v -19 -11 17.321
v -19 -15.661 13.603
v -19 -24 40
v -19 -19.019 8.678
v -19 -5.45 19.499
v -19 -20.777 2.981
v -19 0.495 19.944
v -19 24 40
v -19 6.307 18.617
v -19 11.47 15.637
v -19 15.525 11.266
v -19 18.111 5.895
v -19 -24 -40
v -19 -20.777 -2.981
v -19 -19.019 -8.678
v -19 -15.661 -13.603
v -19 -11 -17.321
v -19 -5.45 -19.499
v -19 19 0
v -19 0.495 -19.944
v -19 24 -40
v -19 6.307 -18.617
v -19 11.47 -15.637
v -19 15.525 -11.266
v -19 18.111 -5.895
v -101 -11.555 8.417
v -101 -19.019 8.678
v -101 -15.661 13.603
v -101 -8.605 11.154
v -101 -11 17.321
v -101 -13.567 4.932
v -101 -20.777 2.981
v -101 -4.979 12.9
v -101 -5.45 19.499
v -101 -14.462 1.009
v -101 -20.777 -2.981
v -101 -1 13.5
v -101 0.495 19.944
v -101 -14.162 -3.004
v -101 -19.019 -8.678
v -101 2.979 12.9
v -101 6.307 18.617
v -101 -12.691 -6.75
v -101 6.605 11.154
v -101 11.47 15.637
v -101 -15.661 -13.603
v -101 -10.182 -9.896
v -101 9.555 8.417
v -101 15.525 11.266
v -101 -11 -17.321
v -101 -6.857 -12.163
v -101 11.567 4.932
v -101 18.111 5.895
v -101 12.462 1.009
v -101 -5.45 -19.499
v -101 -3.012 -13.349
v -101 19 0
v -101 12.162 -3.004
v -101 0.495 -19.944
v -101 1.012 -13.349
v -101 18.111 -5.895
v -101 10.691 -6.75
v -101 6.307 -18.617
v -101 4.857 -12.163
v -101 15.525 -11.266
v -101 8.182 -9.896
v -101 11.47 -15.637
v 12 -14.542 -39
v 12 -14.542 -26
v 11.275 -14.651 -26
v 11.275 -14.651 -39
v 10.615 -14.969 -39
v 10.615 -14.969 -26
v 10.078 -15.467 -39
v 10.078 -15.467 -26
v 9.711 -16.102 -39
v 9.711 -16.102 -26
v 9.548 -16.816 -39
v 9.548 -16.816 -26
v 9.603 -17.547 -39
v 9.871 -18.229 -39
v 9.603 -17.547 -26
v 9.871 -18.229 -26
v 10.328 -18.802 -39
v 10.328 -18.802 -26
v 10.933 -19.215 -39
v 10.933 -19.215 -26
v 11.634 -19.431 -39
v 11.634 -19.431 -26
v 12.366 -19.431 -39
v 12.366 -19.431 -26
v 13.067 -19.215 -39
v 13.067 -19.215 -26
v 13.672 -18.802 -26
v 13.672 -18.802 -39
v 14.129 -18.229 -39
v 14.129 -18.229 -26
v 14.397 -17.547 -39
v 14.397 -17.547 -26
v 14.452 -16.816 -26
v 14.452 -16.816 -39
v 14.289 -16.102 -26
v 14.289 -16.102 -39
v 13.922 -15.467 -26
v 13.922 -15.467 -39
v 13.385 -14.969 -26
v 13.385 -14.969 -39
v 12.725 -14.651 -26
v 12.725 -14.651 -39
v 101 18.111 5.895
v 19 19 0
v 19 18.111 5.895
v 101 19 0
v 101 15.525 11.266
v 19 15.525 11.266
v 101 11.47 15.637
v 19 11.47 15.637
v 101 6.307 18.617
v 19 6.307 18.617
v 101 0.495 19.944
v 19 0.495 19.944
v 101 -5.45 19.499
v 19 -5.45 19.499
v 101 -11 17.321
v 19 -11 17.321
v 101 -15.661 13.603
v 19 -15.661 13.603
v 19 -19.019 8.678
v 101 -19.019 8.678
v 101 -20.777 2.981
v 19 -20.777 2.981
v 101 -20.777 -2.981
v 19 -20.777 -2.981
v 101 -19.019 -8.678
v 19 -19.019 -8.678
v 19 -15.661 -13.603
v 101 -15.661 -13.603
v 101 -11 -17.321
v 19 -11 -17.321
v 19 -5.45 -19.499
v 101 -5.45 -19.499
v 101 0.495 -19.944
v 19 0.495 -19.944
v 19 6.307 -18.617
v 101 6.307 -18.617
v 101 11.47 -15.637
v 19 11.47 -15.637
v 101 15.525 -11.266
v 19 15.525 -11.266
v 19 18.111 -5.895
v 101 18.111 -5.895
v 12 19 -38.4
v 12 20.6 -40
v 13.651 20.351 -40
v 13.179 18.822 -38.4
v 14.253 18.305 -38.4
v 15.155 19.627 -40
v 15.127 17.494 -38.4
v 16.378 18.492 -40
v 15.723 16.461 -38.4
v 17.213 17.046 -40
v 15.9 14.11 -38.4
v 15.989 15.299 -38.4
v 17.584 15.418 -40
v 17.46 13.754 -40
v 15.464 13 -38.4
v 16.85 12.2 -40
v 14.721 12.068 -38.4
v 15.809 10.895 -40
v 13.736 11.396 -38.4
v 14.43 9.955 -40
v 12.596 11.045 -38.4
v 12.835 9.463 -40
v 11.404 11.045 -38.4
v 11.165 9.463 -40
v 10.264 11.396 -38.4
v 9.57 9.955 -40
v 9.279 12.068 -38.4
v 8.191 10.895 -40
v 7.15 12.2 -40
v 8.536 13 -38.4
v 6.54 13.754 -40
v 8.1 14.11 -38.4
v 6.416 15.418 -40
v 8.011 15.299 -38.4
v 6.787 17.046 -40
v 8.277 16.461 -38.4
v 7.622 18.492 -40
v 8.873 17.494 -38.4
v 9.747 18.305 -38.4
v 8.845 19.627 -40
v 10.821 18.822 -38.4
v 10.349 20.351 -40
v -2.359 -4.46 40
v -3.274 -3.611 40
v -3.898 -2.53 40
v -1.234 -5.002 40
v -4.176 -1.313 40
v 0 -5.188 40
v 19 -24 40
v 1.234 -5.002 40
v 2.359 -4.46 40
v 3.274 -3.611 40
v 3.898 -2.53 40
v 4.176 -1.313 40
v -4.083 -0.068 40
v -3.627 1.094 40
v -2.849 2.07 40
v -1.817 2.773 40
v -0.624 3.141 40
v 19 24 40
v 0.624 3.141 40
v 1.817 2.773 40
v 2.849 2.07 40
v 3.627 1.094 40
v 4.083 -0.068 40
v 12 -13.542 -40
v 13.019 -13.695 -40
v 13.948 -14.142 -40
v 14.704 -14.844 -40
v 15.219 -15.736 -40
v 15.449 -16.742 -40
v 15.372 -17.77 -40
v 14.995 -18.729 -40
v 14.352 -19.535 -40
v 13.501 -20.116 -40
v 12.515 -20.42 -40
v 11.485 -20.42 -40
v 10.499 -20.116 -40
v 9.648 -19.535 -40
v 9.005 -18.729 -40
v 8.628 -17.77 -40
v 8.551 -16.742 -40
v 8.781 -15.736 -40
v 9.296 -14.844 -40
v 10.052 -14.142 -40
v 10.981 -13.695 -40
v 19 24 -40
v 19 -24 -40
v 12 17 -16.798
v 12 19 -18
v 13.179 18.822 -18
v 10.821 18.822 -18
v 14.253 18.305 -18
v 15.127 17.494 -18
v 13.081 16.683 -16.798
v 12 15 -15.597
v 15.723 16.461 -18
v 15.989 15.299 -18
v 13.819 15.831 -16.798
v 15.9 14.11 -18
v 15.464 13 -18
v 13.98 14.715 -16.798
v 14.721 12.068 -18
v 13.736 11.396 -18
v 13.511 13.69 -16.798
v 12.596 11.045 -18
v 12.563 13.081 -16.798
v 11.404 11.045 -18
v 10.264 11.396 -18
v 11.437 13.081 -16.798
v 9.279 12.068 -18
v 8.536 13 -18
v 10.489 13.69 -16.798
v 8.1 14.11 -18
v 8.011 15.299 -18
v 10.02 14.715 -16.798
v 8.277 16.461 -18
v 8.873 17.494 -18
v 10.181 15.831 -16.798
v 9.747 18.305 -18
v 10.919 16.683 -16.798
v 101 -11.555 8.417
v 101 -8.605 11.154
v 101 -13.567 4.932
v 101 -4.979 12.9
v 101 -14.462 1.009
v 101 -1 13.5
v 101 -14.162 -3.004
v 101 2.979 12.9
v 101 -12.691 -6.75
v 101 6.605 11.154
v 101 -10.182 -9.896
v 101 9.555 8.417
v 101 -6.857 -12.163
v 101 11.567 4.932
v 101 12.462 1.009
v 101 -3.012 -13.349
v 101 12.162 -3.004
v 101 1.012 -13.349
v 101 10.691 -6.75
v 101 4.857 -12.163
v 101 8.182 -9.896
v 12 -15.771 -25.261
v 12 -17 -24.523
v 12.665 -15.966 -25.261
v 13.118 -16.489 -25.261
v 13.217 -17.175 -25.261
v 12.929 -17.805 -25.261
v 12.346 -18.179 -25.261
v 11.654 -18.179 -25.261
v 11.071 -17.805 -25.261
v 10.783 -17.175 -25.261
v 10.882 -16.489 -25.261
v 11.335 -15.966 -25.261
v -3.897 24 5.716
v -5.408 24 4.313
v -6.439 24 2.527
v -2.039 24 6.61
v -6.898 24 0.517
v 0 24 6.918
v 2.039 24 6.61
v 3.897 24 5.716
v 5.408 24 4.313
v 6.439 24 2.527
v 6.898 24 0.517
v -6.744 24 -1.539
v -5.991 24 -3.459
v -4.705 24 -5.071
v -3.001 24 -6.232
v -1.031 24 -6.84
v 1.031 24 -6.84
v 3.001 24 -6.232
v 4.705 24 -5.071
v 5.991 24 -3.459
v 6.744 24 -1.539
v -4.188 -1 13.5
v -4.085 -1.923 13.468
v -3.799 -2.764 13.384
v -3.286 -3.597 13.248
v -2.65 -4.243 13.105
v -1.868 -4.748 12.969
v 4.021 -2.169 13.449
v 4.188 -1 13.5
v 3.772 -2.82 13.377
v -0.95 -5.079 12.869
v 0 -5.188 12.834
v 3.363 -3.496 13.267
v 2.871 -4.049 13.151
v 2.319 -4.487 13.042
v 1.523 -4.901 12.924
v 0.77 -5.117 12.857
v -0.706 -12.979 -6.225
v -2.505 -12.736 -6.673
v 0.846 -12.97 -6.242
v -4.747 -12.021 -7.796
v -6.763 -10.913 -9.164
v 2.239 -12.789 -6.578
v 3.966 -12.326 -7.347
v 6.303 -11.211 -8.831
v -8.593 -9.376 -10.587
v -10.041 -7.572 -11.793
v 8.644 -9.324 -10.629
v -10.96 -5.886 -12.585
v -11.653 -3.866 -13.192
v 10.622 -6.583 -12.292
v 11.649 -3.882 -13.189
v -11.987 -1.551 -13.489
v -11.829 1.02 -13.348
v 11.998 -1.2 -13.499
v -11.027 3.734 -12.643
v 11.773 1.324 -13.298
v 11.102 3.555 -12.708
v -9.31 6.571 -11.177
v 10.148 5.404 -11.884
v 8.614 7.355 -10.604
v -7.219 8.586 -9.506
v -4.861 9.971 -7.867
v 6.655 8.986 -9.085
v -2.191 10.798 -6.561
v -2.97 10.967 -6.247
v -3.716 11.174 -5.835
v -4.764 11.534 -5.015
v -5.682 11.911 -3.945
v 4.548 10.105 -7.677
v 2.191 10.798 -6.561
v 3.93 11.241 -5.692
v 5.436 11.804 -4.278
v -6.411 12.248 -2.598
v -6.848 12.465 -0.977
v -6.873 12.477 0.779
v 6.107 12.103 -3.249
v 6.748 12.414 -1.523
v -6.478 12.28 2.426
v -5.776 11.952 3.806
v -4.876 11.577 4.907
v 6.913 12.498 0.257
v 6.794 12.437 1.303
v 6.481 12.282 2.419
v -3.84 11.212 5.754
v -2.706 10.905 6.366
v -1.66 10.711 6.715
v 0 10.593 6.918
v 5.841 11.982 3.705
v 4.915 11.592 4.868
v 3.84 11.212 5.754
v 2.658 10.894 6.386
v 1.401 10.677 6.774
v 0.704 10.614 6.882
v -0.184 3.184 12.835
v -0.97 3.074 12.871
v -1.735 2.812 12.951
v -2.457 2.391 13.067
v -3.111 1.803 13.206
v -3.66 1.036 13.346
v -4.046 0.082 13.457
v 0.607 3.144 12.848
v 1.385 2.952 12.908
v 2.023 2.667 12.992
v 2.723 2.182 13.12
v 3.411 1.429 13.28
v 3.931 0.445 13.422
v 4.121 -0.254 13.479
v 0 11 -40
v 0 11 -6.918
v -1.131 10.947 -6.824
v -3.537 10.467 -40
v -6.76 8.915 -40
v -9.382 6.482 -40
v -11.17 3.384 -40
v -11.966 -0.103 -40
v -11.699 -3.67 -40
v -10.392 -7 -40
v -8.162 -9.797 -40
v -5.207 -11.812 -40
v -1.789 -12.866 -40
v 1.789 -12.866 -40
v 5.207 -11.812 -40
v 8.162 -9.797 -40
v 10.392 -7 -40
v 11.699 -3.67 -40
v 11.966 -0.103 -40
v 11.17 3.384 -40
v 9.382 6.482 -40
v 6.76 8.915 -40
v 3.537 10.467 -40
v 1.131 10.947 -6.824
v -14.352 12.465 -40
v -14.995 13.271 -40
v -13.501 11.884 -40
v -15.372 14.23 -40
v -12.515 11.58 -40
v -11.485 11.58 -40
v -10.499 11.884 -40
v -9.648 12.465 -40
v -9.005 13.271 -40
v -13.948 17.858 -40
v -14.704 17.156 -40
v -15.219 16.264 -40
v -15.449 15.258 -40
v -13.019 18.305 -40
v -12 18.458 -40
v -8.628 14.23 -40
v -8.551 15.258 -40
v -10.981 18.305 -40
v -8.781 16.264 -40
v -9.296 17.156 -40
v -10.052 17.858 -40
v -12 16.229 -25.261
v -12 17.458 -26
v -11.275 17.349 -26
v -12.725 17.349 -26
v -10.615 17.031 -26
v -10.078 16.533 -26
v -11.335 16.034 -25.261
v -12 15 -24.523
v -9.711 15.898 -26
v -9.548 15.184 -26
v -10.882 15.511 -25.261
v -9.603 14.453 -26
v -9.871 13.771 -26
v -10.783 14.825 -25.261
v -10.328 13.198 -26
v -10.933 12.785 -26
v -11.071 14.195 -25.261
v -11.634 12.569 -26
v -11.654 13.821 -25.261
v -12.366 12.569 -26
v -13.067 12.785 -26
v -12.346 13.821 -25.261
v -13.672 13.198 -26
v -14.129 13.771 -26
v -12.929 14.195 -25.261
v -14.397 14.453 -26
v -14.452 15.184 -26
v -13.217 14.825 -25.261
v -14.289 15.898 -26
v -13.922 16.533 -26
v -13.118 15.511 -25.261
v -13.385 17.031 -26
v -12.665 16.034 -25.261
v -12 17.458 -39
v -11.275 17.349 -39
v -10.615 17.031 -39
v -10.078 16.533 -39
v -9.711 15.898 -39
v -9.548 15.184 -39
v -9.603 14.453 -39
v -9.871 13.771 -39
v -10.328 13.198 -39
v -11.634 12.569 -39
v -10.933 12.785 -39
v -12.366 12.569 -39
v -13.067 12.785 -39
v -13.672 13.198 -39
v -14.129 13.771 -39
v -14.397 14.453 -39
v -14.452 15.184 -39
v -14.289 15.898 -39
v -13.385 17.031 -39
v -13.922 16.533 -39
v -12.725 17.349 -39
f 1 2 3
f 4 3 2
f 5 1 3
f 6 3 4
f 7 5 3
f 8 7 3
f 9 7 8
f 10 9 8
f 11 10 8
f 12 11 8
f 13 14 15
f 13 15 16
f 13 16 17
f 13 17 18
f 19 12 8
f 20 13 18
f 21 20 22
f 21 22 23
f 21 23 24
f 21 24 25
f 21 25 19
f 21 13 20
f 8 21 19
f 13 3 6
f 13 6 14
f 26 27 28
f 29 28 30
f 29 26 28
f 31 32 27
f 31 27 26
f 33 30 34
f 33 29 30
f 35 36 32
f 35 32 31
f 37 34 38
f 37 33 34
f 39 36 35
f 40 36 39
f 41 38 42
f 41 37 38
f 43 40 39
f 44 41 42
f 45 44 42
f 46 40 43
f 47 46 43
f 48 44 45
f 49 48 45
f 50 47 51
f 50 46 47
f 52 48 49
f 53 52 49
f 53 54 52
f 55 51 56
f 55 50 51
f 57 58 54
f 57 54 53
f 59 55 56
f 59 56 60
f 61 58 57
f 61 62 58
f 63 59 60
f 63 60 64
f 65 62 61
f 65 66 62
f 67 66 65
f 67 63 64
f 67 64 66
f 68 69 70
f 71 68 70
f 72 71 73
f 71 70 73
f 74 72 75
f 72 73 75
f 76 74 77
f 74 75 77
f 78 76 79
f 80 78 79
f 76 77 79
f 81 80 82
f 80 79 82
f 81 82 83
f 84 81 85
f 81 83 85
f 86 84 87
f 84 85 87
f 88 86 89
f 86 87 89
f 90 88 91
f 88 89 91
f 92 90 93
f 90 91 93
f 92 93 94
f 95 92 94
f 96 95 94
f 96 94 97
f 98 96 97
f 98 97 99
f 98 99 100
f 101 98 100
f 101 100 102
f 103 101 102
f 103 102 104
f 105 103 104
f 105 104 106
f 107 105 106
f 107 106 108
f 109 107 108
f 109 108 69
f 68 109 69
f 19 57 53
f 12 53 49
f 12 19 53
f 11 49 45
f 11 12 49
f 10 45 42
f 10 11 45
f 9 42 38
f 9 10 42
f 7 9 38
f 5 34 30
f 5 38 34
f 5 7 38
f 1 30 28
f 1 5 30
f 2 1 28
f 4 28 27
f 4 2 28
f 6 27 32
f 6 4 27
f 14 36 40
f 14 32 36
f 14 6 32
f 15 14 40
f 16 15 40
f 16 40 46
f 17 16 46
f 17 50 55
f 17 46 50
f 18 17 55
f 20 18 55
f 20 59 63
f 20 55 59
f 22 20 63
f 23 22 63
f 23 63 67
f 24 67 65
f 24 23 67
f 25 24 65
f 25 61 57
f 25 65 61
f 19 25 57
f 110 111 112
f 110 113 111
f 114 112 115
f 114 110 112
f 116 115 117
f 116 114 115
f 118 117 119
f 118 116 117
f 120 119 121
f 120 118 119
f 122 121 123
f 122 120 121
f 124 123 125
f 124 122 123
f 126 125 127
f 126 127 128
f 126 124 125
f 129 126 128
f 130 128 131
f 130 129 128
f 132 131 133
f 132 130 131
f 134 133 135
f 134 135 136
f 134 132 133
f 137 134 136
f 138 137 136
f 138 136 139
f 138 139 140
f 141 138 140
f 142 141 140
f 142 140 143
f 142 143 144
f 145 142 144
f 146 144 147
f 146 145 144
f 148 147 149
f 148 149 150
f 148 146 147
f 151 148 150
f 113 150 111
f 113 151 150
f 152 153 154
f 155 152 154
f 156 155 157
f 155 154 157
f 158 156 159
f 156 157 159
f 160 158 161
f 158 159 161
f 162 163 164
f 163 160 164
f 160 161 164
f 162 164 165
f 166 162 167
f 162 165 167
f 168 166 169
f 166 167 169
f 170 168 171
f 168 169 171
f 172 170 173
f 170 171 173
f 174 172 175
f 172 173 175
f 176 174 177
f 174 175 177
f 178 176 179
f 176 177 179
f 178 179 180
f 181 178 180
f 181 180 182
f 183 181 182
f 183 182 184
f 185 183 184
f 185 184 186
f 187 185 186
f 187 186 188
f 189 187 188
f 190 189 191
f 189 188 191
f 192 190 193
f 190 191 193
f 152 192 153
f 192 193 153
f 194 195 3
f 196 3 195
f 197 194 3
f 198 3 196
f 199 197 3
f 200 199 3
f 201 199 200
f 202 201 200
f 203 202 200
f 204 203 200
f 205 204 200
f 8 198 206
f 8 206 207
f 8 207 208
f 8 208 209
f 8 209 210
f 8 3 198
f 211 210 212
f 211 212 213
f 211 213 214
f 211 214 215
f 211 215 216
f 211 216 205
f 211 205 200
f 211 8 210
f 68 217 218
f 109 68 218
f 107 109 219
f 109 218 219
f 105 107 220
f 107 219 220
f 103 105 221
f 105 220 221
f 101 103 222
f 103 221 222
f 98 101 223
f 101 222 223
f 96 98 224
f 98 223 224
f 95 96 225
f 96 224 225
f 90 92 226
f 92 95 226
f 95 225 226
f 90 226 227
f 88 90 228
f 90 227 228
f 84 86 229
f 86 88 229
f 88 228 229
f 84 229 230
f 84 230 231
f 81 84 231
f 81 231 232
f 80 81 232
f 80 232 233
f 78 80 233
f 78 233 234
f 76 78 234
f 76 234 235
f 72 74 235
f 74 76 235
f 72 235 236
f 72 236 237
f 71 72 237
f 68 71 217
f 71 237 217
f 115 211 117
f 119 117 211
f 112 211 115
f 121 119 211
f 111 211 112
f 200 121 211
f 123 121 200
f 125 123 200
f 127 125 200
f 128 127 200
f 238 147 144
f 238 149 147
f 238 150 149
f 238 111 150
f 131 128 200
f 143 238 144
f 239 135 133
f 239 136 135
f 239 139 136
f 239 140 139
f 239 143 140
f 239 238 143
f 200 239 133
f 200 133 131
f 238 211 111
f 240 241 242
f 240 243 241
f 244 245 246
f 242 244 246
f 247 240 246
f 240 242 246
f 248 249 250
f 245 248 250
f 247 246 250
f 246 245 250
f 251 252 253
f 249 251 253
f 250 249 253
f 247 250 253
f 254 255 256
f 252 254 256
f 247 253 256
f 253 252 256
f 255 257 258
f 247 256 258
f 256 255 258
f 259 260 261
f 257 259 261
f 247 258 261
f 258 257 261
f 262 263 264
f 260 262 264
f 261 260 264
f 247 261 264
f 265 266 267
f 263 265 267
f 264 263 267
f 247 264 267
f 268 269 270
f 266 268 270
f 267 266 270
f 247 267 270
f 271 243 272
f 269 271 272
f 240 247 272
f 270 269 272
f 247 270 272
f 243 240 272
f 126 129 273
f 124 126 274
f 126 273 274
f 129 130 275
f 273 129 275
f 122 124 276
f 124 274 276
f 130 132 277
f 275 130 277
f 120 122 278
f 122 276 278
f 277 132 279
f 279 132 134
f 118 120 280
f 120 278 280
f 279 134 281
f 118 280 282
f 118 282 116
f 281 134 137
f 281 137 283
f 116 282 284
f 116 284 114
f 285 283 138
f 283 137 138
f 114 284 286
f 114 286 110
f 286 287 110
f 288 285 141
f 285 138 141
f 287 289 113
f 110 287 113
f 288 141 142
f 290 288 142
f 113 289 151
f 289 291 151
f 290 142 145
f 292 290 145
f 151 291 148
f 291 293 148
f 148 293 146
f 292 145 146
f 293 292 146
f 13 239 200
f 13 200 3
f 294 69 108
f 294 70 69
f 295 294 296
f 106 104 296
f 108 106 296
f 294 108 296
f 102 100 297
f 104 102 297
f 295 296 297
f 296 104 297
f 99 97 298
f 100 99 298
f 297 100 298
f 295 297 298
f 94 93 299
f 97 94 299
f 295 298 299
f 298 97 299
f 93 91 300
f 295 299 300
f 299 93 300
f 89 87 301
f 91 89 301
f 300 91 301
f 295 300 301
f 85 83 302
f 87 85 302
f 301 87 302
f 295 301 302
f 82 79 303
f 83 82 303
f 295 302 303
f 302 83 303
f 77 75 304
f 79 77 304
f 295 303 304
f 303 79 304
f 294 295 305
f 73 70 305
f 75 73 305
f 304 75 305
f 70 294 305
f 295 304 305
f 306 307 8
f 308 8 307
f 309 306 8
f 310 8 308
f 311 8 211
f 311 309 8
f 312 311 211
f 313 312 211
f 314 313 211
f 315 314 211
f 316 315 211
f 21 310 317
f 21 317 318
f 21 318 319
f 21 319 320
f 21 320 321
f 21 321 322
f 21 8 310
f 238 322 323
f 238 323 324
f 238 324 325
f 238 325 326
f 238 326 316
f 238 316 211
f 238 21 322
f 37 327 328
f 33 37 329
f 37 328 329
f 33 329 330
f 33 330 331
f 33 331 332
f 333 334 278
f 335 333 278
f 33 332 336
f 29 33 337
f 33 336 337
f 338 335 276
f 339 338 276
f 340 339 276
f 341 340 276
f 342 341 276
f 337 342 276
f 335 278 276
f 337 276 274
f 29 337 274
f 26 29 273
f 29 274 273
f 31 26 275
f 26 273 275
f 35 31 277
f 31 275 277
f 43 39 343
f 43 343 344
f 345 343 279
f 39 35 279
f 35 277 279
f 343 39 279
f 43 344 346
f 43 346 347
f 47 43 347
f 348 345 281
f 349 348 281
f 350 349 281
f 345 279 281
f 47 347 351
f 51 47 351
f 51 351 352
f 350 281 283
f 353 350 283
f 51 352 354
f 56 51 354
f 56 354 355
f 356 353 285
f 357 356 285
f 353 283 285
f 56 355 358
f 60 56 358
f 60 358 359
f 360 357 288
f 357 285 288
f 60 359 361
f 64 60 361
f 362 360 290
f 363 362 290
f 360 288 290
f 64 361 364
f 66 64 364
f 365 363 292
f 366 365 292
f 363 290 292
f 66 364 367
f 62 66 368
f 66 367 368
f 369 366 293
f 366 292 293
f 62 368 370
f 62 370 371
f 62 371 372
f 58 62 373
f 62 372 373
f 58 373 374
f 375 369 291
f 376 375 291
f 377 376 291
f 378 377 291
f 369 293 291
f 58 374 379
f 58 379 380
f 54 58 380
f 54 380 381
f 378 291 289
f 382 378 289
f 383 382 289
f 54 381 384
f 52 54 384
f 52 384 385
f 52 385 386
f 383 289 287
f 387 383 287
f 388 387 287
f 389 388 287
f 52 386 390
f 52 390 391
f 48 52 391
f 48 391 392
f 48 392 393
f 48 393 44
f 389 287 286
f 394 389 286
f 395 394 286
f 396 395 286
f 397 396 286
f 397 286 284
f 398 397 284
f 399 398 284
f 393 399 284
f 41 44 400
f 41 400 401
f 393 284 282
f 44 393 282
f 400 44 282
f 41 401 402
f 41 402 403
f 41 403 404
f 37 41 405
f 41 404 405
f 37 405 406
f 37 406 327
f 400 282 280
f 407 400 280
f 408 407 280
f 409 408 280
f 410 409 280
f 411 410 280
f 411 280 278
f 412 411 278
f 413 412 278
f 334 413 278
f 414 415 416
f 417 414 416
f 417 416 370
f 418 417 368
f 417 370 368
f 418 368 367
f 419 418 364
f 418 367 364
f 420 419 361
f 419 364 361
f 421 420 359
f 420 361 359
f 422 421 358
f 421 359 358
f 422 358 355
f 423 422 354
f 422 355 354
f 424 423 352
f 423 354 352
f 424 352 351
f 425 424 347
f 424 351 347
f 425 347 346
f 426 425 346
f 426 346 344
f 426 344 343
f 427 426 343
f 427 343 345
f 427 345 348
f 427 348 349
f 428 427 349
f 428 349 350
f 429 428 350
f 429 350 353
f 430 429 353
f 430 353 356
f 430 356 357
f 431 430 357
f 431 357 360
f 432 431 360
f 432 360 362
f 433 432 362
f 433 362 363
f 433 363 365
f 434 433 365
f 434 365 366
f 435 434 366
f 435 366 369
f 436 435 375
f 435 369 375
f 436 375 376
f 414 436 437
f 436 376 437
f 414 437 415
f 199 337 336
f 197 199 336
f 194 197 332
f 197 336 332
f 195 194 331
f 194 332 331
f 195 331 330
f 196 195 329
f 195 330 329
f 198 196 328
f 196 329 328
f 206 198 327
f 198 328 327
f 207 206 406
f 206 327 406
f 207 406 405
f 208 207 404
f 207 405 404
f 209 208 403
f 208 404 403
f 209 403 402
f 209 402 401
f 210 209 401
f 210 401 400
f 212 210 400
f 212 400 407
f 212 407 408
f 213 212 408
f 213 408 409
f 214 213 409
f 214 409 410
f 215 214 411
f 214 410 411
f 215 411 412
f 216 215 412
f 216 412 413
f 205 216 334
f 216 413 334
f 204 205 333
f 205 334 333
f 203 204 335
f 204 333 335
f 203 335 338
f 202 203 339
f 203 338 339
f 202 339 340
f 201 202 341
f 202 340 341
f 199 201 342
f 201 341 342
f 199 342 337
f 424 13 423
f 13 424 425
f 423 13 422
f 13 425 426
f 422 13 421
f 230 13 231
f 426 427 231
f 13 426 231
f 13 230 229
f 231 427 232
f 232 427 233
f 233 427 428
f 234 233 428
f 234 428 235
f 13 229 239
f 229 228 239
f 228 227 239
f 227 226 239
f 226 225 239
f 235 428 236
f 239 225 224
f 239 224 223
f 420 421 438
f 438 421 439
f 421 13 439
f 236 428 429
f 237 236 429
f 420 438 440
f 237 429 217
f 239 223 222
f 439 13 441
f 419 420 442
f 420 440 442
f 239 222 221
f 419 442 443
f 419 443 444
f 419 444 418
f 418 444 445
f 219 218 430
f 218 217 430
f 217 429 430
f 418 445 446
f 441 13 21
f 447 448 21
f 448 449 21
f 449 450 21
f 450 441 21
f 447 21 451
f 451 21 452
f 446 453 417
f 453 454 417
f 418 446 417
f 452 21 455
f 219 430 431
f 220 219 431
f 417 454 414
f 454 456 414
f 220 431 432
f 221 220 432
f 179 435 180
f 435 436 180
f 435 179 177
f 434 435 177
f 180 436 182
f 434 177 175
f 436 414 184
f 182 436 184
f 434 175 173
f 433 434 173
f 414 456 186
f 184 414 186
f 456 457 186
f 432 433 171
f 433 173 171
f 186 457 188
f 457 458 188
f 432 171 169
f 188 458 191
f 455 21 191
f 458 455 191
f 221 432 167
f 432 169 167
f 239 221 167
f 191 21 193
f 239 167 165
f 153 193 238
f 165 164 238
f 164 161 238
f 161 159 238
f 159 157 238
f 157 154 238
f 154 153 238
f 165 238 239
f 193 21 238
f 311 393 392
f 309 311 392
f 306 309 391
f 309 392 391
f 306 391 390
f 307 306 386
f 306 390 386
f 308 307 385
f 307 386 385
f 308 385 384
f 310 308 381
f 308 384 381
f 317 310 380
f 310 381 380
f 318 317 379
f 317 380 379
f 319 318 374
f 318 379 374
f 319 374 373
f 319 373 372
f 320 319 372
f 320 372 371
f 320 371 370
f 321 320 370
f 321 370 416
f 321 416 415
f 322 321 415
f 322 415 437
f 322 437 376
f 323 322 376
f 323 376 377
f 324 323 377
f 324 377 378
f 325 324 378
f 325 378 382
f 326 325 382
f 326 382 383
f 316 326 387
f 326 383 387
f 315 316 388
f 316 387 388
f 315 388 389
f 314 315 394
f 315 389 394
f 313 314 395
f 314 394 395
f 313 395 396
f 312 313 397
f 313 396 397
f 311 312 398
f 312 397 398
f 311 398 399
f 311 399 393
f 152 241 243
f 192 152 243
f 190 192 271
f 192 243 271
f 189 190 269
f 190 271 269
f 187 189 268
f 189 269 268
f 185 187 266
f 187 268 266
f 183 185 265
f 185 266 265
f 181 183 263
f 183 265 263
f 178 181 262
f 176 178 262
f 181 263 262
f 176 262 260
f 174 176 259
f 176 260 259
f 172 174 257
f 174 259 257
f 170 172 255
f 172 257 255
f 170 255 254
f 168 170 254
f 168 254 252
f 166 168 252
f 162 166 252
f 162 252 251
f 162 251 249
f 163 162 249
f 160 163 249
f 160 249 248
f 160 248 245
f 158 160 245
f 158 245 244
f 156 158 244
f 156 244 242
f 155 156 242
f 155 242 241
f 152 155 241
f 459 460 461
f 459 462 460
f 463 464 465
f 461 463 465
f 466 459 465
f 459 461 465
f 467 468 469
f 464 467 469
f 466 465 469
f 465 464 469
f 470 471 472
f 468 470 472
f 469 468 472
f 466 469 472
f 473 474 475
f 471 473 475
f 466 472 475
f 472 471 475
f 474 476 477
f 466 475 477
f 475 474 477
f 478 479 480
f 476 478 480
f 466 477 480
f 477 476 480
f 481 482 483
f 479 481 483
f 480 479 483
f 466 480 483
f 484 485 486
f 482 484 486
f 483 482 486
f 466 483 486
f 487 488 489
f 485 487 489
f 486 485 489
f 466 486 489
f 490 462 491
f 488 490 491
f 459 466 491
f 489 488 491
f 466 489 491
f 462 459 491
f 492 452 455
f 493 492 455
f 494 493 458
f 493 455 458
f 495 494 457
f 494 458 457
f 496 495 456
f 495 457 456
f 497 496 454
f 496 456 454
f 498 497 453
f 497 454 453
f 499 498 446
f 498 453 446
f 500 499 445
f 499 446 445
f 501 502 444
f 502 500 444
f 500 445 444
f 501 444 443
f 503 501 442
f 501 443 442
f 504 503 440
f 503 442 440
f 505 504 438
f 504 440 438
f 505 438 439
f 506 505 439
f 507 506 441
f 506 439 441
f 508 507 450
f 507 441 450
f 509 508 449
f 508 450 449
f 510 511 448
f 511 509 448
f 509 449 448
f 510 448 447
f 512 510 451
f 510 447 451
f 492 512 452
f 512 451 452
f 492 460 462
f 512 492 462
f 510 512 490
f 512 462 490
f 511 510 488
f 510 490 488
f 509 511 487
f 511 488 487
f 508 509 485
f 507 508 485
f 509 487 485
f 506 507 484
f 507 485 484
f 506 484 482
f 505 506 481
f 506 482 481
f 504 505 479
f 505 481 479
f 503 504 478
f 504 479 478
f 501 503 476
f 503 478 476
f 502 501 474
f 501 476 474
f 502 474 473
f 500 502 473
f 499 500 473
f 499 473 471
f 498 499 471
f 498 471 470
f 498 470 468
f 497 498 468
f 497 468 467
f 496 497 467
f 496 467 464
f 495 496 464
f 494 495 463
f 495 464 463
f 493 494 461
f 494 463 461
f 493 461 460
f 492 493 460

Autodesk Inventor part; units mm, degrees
ref_plane "YZ Plane" through (0, 0, 0) normal (1, 0, 0) x (0, 1, 0)
ref_plane "XZ Plane" through (0, 0, 0) normal (0, 1, 0) x (-1, 0, 0)
ref_plane "XY Plane" through (0, 0, 0) normal (0, 0, 1) x (1, 0, 0)
sketch "Эскиз1" plane through (0, 0, 0) normal (0, 0, 1) x (1, 0, 0)
  line L0 (-19, 24) -> (19, 24)
  line L1 (19, 24) -> (19, -24)
  line L2 (19, -24) -> (-19, -24)
  line L3 (-19, -24) -> (-19, 24)
  line L4 (-19, 24) -> (19, -24) construction
  line L5 (19, 24) -> (-19, -24) construction
  line L6 (-101, 19) -> (101, 19)
  line L7 (101, 19) -> (101, -1)
  line L8 (101, -1) -> (-101, -1)
  line L9 (-101, -1) -> (-101, 19)
  point P0 (0, 0)
  point P1 (0, 0)
  point P2 (0, -1)
  point P3 (0, 0)
  dimension "d1" = 38
  dimension "d2" = 48
  dimension "d3" = 202
  dimension "d4" = 40
  dimension "d75" = 25
extrude "Выдавливание1" add sketch "Эскиз1" along normal mid plane 80 contours L0 L1 L6 L3 | L6 L1 L8 L3 | L8 L1 L2 L3
revolve "Вращение1" add sketch "Эскиз1" angle 360 about axis through (101, -1, 0) along (-1, 0, 0) contours L6 L1 L8 L3 | L3 L8 L9 L6 | L6 L7 L8 L1
hole "Отверстие1" at (-101, -1, 0) direction (1, 0, 0) diameter 27 end through all
hole "Отверстие2" at (0, -1, -40) direction (0, 0, 1) diameter 24 end up to surface
hole "Отверстие3" at (0, -1, 40) direction (0, 0, -1) diameter 8.376 end up to surface thread size "M10x1.5" class "6H" standard "ISO Metric profile"
hole "Отверстие4" at (0, 24, 0) direction (0, -1, 0) diameter 13.835 end up to surface thread size "M16x2" class "6H" standard "ISO Metric profile"
sketch "Эскиз2" plane through (0, 0, -40) normal (0, 0, -1) x (-1, 0, 0)
  circle A0 centre (0, -1) radius 12 projected
  point P0 (12, 15)
  point P1 (-12, -17)
  point P2 (-12, 15)
  dimension "d71" = 12
  dimension "d73" = 16
  dimension "d76" = 32
  dimension "d77" = 12
hole "Отверстие5" at (-12, 15, -40) at (12, -17, -40) direction (0, 0, 1) diameter 4.917 depth 14 tip angle 118 thread size "M6x1" class "6H" standard "ISO Metric profile"
hole "Отверстие6" at (12, 15, -40) direction (0, 0, 1) diameter 8 depth 22 tip angle 118
chamfer "Фаска1" distance 1 angle 45 2 edges at (-12, 12.5415, -40) (12, -19.4585, -40)
chamfer "Фаска2" distance 1.6 angle 45 1 edges at (12, 11, -40)
properties part number "Колонка"
